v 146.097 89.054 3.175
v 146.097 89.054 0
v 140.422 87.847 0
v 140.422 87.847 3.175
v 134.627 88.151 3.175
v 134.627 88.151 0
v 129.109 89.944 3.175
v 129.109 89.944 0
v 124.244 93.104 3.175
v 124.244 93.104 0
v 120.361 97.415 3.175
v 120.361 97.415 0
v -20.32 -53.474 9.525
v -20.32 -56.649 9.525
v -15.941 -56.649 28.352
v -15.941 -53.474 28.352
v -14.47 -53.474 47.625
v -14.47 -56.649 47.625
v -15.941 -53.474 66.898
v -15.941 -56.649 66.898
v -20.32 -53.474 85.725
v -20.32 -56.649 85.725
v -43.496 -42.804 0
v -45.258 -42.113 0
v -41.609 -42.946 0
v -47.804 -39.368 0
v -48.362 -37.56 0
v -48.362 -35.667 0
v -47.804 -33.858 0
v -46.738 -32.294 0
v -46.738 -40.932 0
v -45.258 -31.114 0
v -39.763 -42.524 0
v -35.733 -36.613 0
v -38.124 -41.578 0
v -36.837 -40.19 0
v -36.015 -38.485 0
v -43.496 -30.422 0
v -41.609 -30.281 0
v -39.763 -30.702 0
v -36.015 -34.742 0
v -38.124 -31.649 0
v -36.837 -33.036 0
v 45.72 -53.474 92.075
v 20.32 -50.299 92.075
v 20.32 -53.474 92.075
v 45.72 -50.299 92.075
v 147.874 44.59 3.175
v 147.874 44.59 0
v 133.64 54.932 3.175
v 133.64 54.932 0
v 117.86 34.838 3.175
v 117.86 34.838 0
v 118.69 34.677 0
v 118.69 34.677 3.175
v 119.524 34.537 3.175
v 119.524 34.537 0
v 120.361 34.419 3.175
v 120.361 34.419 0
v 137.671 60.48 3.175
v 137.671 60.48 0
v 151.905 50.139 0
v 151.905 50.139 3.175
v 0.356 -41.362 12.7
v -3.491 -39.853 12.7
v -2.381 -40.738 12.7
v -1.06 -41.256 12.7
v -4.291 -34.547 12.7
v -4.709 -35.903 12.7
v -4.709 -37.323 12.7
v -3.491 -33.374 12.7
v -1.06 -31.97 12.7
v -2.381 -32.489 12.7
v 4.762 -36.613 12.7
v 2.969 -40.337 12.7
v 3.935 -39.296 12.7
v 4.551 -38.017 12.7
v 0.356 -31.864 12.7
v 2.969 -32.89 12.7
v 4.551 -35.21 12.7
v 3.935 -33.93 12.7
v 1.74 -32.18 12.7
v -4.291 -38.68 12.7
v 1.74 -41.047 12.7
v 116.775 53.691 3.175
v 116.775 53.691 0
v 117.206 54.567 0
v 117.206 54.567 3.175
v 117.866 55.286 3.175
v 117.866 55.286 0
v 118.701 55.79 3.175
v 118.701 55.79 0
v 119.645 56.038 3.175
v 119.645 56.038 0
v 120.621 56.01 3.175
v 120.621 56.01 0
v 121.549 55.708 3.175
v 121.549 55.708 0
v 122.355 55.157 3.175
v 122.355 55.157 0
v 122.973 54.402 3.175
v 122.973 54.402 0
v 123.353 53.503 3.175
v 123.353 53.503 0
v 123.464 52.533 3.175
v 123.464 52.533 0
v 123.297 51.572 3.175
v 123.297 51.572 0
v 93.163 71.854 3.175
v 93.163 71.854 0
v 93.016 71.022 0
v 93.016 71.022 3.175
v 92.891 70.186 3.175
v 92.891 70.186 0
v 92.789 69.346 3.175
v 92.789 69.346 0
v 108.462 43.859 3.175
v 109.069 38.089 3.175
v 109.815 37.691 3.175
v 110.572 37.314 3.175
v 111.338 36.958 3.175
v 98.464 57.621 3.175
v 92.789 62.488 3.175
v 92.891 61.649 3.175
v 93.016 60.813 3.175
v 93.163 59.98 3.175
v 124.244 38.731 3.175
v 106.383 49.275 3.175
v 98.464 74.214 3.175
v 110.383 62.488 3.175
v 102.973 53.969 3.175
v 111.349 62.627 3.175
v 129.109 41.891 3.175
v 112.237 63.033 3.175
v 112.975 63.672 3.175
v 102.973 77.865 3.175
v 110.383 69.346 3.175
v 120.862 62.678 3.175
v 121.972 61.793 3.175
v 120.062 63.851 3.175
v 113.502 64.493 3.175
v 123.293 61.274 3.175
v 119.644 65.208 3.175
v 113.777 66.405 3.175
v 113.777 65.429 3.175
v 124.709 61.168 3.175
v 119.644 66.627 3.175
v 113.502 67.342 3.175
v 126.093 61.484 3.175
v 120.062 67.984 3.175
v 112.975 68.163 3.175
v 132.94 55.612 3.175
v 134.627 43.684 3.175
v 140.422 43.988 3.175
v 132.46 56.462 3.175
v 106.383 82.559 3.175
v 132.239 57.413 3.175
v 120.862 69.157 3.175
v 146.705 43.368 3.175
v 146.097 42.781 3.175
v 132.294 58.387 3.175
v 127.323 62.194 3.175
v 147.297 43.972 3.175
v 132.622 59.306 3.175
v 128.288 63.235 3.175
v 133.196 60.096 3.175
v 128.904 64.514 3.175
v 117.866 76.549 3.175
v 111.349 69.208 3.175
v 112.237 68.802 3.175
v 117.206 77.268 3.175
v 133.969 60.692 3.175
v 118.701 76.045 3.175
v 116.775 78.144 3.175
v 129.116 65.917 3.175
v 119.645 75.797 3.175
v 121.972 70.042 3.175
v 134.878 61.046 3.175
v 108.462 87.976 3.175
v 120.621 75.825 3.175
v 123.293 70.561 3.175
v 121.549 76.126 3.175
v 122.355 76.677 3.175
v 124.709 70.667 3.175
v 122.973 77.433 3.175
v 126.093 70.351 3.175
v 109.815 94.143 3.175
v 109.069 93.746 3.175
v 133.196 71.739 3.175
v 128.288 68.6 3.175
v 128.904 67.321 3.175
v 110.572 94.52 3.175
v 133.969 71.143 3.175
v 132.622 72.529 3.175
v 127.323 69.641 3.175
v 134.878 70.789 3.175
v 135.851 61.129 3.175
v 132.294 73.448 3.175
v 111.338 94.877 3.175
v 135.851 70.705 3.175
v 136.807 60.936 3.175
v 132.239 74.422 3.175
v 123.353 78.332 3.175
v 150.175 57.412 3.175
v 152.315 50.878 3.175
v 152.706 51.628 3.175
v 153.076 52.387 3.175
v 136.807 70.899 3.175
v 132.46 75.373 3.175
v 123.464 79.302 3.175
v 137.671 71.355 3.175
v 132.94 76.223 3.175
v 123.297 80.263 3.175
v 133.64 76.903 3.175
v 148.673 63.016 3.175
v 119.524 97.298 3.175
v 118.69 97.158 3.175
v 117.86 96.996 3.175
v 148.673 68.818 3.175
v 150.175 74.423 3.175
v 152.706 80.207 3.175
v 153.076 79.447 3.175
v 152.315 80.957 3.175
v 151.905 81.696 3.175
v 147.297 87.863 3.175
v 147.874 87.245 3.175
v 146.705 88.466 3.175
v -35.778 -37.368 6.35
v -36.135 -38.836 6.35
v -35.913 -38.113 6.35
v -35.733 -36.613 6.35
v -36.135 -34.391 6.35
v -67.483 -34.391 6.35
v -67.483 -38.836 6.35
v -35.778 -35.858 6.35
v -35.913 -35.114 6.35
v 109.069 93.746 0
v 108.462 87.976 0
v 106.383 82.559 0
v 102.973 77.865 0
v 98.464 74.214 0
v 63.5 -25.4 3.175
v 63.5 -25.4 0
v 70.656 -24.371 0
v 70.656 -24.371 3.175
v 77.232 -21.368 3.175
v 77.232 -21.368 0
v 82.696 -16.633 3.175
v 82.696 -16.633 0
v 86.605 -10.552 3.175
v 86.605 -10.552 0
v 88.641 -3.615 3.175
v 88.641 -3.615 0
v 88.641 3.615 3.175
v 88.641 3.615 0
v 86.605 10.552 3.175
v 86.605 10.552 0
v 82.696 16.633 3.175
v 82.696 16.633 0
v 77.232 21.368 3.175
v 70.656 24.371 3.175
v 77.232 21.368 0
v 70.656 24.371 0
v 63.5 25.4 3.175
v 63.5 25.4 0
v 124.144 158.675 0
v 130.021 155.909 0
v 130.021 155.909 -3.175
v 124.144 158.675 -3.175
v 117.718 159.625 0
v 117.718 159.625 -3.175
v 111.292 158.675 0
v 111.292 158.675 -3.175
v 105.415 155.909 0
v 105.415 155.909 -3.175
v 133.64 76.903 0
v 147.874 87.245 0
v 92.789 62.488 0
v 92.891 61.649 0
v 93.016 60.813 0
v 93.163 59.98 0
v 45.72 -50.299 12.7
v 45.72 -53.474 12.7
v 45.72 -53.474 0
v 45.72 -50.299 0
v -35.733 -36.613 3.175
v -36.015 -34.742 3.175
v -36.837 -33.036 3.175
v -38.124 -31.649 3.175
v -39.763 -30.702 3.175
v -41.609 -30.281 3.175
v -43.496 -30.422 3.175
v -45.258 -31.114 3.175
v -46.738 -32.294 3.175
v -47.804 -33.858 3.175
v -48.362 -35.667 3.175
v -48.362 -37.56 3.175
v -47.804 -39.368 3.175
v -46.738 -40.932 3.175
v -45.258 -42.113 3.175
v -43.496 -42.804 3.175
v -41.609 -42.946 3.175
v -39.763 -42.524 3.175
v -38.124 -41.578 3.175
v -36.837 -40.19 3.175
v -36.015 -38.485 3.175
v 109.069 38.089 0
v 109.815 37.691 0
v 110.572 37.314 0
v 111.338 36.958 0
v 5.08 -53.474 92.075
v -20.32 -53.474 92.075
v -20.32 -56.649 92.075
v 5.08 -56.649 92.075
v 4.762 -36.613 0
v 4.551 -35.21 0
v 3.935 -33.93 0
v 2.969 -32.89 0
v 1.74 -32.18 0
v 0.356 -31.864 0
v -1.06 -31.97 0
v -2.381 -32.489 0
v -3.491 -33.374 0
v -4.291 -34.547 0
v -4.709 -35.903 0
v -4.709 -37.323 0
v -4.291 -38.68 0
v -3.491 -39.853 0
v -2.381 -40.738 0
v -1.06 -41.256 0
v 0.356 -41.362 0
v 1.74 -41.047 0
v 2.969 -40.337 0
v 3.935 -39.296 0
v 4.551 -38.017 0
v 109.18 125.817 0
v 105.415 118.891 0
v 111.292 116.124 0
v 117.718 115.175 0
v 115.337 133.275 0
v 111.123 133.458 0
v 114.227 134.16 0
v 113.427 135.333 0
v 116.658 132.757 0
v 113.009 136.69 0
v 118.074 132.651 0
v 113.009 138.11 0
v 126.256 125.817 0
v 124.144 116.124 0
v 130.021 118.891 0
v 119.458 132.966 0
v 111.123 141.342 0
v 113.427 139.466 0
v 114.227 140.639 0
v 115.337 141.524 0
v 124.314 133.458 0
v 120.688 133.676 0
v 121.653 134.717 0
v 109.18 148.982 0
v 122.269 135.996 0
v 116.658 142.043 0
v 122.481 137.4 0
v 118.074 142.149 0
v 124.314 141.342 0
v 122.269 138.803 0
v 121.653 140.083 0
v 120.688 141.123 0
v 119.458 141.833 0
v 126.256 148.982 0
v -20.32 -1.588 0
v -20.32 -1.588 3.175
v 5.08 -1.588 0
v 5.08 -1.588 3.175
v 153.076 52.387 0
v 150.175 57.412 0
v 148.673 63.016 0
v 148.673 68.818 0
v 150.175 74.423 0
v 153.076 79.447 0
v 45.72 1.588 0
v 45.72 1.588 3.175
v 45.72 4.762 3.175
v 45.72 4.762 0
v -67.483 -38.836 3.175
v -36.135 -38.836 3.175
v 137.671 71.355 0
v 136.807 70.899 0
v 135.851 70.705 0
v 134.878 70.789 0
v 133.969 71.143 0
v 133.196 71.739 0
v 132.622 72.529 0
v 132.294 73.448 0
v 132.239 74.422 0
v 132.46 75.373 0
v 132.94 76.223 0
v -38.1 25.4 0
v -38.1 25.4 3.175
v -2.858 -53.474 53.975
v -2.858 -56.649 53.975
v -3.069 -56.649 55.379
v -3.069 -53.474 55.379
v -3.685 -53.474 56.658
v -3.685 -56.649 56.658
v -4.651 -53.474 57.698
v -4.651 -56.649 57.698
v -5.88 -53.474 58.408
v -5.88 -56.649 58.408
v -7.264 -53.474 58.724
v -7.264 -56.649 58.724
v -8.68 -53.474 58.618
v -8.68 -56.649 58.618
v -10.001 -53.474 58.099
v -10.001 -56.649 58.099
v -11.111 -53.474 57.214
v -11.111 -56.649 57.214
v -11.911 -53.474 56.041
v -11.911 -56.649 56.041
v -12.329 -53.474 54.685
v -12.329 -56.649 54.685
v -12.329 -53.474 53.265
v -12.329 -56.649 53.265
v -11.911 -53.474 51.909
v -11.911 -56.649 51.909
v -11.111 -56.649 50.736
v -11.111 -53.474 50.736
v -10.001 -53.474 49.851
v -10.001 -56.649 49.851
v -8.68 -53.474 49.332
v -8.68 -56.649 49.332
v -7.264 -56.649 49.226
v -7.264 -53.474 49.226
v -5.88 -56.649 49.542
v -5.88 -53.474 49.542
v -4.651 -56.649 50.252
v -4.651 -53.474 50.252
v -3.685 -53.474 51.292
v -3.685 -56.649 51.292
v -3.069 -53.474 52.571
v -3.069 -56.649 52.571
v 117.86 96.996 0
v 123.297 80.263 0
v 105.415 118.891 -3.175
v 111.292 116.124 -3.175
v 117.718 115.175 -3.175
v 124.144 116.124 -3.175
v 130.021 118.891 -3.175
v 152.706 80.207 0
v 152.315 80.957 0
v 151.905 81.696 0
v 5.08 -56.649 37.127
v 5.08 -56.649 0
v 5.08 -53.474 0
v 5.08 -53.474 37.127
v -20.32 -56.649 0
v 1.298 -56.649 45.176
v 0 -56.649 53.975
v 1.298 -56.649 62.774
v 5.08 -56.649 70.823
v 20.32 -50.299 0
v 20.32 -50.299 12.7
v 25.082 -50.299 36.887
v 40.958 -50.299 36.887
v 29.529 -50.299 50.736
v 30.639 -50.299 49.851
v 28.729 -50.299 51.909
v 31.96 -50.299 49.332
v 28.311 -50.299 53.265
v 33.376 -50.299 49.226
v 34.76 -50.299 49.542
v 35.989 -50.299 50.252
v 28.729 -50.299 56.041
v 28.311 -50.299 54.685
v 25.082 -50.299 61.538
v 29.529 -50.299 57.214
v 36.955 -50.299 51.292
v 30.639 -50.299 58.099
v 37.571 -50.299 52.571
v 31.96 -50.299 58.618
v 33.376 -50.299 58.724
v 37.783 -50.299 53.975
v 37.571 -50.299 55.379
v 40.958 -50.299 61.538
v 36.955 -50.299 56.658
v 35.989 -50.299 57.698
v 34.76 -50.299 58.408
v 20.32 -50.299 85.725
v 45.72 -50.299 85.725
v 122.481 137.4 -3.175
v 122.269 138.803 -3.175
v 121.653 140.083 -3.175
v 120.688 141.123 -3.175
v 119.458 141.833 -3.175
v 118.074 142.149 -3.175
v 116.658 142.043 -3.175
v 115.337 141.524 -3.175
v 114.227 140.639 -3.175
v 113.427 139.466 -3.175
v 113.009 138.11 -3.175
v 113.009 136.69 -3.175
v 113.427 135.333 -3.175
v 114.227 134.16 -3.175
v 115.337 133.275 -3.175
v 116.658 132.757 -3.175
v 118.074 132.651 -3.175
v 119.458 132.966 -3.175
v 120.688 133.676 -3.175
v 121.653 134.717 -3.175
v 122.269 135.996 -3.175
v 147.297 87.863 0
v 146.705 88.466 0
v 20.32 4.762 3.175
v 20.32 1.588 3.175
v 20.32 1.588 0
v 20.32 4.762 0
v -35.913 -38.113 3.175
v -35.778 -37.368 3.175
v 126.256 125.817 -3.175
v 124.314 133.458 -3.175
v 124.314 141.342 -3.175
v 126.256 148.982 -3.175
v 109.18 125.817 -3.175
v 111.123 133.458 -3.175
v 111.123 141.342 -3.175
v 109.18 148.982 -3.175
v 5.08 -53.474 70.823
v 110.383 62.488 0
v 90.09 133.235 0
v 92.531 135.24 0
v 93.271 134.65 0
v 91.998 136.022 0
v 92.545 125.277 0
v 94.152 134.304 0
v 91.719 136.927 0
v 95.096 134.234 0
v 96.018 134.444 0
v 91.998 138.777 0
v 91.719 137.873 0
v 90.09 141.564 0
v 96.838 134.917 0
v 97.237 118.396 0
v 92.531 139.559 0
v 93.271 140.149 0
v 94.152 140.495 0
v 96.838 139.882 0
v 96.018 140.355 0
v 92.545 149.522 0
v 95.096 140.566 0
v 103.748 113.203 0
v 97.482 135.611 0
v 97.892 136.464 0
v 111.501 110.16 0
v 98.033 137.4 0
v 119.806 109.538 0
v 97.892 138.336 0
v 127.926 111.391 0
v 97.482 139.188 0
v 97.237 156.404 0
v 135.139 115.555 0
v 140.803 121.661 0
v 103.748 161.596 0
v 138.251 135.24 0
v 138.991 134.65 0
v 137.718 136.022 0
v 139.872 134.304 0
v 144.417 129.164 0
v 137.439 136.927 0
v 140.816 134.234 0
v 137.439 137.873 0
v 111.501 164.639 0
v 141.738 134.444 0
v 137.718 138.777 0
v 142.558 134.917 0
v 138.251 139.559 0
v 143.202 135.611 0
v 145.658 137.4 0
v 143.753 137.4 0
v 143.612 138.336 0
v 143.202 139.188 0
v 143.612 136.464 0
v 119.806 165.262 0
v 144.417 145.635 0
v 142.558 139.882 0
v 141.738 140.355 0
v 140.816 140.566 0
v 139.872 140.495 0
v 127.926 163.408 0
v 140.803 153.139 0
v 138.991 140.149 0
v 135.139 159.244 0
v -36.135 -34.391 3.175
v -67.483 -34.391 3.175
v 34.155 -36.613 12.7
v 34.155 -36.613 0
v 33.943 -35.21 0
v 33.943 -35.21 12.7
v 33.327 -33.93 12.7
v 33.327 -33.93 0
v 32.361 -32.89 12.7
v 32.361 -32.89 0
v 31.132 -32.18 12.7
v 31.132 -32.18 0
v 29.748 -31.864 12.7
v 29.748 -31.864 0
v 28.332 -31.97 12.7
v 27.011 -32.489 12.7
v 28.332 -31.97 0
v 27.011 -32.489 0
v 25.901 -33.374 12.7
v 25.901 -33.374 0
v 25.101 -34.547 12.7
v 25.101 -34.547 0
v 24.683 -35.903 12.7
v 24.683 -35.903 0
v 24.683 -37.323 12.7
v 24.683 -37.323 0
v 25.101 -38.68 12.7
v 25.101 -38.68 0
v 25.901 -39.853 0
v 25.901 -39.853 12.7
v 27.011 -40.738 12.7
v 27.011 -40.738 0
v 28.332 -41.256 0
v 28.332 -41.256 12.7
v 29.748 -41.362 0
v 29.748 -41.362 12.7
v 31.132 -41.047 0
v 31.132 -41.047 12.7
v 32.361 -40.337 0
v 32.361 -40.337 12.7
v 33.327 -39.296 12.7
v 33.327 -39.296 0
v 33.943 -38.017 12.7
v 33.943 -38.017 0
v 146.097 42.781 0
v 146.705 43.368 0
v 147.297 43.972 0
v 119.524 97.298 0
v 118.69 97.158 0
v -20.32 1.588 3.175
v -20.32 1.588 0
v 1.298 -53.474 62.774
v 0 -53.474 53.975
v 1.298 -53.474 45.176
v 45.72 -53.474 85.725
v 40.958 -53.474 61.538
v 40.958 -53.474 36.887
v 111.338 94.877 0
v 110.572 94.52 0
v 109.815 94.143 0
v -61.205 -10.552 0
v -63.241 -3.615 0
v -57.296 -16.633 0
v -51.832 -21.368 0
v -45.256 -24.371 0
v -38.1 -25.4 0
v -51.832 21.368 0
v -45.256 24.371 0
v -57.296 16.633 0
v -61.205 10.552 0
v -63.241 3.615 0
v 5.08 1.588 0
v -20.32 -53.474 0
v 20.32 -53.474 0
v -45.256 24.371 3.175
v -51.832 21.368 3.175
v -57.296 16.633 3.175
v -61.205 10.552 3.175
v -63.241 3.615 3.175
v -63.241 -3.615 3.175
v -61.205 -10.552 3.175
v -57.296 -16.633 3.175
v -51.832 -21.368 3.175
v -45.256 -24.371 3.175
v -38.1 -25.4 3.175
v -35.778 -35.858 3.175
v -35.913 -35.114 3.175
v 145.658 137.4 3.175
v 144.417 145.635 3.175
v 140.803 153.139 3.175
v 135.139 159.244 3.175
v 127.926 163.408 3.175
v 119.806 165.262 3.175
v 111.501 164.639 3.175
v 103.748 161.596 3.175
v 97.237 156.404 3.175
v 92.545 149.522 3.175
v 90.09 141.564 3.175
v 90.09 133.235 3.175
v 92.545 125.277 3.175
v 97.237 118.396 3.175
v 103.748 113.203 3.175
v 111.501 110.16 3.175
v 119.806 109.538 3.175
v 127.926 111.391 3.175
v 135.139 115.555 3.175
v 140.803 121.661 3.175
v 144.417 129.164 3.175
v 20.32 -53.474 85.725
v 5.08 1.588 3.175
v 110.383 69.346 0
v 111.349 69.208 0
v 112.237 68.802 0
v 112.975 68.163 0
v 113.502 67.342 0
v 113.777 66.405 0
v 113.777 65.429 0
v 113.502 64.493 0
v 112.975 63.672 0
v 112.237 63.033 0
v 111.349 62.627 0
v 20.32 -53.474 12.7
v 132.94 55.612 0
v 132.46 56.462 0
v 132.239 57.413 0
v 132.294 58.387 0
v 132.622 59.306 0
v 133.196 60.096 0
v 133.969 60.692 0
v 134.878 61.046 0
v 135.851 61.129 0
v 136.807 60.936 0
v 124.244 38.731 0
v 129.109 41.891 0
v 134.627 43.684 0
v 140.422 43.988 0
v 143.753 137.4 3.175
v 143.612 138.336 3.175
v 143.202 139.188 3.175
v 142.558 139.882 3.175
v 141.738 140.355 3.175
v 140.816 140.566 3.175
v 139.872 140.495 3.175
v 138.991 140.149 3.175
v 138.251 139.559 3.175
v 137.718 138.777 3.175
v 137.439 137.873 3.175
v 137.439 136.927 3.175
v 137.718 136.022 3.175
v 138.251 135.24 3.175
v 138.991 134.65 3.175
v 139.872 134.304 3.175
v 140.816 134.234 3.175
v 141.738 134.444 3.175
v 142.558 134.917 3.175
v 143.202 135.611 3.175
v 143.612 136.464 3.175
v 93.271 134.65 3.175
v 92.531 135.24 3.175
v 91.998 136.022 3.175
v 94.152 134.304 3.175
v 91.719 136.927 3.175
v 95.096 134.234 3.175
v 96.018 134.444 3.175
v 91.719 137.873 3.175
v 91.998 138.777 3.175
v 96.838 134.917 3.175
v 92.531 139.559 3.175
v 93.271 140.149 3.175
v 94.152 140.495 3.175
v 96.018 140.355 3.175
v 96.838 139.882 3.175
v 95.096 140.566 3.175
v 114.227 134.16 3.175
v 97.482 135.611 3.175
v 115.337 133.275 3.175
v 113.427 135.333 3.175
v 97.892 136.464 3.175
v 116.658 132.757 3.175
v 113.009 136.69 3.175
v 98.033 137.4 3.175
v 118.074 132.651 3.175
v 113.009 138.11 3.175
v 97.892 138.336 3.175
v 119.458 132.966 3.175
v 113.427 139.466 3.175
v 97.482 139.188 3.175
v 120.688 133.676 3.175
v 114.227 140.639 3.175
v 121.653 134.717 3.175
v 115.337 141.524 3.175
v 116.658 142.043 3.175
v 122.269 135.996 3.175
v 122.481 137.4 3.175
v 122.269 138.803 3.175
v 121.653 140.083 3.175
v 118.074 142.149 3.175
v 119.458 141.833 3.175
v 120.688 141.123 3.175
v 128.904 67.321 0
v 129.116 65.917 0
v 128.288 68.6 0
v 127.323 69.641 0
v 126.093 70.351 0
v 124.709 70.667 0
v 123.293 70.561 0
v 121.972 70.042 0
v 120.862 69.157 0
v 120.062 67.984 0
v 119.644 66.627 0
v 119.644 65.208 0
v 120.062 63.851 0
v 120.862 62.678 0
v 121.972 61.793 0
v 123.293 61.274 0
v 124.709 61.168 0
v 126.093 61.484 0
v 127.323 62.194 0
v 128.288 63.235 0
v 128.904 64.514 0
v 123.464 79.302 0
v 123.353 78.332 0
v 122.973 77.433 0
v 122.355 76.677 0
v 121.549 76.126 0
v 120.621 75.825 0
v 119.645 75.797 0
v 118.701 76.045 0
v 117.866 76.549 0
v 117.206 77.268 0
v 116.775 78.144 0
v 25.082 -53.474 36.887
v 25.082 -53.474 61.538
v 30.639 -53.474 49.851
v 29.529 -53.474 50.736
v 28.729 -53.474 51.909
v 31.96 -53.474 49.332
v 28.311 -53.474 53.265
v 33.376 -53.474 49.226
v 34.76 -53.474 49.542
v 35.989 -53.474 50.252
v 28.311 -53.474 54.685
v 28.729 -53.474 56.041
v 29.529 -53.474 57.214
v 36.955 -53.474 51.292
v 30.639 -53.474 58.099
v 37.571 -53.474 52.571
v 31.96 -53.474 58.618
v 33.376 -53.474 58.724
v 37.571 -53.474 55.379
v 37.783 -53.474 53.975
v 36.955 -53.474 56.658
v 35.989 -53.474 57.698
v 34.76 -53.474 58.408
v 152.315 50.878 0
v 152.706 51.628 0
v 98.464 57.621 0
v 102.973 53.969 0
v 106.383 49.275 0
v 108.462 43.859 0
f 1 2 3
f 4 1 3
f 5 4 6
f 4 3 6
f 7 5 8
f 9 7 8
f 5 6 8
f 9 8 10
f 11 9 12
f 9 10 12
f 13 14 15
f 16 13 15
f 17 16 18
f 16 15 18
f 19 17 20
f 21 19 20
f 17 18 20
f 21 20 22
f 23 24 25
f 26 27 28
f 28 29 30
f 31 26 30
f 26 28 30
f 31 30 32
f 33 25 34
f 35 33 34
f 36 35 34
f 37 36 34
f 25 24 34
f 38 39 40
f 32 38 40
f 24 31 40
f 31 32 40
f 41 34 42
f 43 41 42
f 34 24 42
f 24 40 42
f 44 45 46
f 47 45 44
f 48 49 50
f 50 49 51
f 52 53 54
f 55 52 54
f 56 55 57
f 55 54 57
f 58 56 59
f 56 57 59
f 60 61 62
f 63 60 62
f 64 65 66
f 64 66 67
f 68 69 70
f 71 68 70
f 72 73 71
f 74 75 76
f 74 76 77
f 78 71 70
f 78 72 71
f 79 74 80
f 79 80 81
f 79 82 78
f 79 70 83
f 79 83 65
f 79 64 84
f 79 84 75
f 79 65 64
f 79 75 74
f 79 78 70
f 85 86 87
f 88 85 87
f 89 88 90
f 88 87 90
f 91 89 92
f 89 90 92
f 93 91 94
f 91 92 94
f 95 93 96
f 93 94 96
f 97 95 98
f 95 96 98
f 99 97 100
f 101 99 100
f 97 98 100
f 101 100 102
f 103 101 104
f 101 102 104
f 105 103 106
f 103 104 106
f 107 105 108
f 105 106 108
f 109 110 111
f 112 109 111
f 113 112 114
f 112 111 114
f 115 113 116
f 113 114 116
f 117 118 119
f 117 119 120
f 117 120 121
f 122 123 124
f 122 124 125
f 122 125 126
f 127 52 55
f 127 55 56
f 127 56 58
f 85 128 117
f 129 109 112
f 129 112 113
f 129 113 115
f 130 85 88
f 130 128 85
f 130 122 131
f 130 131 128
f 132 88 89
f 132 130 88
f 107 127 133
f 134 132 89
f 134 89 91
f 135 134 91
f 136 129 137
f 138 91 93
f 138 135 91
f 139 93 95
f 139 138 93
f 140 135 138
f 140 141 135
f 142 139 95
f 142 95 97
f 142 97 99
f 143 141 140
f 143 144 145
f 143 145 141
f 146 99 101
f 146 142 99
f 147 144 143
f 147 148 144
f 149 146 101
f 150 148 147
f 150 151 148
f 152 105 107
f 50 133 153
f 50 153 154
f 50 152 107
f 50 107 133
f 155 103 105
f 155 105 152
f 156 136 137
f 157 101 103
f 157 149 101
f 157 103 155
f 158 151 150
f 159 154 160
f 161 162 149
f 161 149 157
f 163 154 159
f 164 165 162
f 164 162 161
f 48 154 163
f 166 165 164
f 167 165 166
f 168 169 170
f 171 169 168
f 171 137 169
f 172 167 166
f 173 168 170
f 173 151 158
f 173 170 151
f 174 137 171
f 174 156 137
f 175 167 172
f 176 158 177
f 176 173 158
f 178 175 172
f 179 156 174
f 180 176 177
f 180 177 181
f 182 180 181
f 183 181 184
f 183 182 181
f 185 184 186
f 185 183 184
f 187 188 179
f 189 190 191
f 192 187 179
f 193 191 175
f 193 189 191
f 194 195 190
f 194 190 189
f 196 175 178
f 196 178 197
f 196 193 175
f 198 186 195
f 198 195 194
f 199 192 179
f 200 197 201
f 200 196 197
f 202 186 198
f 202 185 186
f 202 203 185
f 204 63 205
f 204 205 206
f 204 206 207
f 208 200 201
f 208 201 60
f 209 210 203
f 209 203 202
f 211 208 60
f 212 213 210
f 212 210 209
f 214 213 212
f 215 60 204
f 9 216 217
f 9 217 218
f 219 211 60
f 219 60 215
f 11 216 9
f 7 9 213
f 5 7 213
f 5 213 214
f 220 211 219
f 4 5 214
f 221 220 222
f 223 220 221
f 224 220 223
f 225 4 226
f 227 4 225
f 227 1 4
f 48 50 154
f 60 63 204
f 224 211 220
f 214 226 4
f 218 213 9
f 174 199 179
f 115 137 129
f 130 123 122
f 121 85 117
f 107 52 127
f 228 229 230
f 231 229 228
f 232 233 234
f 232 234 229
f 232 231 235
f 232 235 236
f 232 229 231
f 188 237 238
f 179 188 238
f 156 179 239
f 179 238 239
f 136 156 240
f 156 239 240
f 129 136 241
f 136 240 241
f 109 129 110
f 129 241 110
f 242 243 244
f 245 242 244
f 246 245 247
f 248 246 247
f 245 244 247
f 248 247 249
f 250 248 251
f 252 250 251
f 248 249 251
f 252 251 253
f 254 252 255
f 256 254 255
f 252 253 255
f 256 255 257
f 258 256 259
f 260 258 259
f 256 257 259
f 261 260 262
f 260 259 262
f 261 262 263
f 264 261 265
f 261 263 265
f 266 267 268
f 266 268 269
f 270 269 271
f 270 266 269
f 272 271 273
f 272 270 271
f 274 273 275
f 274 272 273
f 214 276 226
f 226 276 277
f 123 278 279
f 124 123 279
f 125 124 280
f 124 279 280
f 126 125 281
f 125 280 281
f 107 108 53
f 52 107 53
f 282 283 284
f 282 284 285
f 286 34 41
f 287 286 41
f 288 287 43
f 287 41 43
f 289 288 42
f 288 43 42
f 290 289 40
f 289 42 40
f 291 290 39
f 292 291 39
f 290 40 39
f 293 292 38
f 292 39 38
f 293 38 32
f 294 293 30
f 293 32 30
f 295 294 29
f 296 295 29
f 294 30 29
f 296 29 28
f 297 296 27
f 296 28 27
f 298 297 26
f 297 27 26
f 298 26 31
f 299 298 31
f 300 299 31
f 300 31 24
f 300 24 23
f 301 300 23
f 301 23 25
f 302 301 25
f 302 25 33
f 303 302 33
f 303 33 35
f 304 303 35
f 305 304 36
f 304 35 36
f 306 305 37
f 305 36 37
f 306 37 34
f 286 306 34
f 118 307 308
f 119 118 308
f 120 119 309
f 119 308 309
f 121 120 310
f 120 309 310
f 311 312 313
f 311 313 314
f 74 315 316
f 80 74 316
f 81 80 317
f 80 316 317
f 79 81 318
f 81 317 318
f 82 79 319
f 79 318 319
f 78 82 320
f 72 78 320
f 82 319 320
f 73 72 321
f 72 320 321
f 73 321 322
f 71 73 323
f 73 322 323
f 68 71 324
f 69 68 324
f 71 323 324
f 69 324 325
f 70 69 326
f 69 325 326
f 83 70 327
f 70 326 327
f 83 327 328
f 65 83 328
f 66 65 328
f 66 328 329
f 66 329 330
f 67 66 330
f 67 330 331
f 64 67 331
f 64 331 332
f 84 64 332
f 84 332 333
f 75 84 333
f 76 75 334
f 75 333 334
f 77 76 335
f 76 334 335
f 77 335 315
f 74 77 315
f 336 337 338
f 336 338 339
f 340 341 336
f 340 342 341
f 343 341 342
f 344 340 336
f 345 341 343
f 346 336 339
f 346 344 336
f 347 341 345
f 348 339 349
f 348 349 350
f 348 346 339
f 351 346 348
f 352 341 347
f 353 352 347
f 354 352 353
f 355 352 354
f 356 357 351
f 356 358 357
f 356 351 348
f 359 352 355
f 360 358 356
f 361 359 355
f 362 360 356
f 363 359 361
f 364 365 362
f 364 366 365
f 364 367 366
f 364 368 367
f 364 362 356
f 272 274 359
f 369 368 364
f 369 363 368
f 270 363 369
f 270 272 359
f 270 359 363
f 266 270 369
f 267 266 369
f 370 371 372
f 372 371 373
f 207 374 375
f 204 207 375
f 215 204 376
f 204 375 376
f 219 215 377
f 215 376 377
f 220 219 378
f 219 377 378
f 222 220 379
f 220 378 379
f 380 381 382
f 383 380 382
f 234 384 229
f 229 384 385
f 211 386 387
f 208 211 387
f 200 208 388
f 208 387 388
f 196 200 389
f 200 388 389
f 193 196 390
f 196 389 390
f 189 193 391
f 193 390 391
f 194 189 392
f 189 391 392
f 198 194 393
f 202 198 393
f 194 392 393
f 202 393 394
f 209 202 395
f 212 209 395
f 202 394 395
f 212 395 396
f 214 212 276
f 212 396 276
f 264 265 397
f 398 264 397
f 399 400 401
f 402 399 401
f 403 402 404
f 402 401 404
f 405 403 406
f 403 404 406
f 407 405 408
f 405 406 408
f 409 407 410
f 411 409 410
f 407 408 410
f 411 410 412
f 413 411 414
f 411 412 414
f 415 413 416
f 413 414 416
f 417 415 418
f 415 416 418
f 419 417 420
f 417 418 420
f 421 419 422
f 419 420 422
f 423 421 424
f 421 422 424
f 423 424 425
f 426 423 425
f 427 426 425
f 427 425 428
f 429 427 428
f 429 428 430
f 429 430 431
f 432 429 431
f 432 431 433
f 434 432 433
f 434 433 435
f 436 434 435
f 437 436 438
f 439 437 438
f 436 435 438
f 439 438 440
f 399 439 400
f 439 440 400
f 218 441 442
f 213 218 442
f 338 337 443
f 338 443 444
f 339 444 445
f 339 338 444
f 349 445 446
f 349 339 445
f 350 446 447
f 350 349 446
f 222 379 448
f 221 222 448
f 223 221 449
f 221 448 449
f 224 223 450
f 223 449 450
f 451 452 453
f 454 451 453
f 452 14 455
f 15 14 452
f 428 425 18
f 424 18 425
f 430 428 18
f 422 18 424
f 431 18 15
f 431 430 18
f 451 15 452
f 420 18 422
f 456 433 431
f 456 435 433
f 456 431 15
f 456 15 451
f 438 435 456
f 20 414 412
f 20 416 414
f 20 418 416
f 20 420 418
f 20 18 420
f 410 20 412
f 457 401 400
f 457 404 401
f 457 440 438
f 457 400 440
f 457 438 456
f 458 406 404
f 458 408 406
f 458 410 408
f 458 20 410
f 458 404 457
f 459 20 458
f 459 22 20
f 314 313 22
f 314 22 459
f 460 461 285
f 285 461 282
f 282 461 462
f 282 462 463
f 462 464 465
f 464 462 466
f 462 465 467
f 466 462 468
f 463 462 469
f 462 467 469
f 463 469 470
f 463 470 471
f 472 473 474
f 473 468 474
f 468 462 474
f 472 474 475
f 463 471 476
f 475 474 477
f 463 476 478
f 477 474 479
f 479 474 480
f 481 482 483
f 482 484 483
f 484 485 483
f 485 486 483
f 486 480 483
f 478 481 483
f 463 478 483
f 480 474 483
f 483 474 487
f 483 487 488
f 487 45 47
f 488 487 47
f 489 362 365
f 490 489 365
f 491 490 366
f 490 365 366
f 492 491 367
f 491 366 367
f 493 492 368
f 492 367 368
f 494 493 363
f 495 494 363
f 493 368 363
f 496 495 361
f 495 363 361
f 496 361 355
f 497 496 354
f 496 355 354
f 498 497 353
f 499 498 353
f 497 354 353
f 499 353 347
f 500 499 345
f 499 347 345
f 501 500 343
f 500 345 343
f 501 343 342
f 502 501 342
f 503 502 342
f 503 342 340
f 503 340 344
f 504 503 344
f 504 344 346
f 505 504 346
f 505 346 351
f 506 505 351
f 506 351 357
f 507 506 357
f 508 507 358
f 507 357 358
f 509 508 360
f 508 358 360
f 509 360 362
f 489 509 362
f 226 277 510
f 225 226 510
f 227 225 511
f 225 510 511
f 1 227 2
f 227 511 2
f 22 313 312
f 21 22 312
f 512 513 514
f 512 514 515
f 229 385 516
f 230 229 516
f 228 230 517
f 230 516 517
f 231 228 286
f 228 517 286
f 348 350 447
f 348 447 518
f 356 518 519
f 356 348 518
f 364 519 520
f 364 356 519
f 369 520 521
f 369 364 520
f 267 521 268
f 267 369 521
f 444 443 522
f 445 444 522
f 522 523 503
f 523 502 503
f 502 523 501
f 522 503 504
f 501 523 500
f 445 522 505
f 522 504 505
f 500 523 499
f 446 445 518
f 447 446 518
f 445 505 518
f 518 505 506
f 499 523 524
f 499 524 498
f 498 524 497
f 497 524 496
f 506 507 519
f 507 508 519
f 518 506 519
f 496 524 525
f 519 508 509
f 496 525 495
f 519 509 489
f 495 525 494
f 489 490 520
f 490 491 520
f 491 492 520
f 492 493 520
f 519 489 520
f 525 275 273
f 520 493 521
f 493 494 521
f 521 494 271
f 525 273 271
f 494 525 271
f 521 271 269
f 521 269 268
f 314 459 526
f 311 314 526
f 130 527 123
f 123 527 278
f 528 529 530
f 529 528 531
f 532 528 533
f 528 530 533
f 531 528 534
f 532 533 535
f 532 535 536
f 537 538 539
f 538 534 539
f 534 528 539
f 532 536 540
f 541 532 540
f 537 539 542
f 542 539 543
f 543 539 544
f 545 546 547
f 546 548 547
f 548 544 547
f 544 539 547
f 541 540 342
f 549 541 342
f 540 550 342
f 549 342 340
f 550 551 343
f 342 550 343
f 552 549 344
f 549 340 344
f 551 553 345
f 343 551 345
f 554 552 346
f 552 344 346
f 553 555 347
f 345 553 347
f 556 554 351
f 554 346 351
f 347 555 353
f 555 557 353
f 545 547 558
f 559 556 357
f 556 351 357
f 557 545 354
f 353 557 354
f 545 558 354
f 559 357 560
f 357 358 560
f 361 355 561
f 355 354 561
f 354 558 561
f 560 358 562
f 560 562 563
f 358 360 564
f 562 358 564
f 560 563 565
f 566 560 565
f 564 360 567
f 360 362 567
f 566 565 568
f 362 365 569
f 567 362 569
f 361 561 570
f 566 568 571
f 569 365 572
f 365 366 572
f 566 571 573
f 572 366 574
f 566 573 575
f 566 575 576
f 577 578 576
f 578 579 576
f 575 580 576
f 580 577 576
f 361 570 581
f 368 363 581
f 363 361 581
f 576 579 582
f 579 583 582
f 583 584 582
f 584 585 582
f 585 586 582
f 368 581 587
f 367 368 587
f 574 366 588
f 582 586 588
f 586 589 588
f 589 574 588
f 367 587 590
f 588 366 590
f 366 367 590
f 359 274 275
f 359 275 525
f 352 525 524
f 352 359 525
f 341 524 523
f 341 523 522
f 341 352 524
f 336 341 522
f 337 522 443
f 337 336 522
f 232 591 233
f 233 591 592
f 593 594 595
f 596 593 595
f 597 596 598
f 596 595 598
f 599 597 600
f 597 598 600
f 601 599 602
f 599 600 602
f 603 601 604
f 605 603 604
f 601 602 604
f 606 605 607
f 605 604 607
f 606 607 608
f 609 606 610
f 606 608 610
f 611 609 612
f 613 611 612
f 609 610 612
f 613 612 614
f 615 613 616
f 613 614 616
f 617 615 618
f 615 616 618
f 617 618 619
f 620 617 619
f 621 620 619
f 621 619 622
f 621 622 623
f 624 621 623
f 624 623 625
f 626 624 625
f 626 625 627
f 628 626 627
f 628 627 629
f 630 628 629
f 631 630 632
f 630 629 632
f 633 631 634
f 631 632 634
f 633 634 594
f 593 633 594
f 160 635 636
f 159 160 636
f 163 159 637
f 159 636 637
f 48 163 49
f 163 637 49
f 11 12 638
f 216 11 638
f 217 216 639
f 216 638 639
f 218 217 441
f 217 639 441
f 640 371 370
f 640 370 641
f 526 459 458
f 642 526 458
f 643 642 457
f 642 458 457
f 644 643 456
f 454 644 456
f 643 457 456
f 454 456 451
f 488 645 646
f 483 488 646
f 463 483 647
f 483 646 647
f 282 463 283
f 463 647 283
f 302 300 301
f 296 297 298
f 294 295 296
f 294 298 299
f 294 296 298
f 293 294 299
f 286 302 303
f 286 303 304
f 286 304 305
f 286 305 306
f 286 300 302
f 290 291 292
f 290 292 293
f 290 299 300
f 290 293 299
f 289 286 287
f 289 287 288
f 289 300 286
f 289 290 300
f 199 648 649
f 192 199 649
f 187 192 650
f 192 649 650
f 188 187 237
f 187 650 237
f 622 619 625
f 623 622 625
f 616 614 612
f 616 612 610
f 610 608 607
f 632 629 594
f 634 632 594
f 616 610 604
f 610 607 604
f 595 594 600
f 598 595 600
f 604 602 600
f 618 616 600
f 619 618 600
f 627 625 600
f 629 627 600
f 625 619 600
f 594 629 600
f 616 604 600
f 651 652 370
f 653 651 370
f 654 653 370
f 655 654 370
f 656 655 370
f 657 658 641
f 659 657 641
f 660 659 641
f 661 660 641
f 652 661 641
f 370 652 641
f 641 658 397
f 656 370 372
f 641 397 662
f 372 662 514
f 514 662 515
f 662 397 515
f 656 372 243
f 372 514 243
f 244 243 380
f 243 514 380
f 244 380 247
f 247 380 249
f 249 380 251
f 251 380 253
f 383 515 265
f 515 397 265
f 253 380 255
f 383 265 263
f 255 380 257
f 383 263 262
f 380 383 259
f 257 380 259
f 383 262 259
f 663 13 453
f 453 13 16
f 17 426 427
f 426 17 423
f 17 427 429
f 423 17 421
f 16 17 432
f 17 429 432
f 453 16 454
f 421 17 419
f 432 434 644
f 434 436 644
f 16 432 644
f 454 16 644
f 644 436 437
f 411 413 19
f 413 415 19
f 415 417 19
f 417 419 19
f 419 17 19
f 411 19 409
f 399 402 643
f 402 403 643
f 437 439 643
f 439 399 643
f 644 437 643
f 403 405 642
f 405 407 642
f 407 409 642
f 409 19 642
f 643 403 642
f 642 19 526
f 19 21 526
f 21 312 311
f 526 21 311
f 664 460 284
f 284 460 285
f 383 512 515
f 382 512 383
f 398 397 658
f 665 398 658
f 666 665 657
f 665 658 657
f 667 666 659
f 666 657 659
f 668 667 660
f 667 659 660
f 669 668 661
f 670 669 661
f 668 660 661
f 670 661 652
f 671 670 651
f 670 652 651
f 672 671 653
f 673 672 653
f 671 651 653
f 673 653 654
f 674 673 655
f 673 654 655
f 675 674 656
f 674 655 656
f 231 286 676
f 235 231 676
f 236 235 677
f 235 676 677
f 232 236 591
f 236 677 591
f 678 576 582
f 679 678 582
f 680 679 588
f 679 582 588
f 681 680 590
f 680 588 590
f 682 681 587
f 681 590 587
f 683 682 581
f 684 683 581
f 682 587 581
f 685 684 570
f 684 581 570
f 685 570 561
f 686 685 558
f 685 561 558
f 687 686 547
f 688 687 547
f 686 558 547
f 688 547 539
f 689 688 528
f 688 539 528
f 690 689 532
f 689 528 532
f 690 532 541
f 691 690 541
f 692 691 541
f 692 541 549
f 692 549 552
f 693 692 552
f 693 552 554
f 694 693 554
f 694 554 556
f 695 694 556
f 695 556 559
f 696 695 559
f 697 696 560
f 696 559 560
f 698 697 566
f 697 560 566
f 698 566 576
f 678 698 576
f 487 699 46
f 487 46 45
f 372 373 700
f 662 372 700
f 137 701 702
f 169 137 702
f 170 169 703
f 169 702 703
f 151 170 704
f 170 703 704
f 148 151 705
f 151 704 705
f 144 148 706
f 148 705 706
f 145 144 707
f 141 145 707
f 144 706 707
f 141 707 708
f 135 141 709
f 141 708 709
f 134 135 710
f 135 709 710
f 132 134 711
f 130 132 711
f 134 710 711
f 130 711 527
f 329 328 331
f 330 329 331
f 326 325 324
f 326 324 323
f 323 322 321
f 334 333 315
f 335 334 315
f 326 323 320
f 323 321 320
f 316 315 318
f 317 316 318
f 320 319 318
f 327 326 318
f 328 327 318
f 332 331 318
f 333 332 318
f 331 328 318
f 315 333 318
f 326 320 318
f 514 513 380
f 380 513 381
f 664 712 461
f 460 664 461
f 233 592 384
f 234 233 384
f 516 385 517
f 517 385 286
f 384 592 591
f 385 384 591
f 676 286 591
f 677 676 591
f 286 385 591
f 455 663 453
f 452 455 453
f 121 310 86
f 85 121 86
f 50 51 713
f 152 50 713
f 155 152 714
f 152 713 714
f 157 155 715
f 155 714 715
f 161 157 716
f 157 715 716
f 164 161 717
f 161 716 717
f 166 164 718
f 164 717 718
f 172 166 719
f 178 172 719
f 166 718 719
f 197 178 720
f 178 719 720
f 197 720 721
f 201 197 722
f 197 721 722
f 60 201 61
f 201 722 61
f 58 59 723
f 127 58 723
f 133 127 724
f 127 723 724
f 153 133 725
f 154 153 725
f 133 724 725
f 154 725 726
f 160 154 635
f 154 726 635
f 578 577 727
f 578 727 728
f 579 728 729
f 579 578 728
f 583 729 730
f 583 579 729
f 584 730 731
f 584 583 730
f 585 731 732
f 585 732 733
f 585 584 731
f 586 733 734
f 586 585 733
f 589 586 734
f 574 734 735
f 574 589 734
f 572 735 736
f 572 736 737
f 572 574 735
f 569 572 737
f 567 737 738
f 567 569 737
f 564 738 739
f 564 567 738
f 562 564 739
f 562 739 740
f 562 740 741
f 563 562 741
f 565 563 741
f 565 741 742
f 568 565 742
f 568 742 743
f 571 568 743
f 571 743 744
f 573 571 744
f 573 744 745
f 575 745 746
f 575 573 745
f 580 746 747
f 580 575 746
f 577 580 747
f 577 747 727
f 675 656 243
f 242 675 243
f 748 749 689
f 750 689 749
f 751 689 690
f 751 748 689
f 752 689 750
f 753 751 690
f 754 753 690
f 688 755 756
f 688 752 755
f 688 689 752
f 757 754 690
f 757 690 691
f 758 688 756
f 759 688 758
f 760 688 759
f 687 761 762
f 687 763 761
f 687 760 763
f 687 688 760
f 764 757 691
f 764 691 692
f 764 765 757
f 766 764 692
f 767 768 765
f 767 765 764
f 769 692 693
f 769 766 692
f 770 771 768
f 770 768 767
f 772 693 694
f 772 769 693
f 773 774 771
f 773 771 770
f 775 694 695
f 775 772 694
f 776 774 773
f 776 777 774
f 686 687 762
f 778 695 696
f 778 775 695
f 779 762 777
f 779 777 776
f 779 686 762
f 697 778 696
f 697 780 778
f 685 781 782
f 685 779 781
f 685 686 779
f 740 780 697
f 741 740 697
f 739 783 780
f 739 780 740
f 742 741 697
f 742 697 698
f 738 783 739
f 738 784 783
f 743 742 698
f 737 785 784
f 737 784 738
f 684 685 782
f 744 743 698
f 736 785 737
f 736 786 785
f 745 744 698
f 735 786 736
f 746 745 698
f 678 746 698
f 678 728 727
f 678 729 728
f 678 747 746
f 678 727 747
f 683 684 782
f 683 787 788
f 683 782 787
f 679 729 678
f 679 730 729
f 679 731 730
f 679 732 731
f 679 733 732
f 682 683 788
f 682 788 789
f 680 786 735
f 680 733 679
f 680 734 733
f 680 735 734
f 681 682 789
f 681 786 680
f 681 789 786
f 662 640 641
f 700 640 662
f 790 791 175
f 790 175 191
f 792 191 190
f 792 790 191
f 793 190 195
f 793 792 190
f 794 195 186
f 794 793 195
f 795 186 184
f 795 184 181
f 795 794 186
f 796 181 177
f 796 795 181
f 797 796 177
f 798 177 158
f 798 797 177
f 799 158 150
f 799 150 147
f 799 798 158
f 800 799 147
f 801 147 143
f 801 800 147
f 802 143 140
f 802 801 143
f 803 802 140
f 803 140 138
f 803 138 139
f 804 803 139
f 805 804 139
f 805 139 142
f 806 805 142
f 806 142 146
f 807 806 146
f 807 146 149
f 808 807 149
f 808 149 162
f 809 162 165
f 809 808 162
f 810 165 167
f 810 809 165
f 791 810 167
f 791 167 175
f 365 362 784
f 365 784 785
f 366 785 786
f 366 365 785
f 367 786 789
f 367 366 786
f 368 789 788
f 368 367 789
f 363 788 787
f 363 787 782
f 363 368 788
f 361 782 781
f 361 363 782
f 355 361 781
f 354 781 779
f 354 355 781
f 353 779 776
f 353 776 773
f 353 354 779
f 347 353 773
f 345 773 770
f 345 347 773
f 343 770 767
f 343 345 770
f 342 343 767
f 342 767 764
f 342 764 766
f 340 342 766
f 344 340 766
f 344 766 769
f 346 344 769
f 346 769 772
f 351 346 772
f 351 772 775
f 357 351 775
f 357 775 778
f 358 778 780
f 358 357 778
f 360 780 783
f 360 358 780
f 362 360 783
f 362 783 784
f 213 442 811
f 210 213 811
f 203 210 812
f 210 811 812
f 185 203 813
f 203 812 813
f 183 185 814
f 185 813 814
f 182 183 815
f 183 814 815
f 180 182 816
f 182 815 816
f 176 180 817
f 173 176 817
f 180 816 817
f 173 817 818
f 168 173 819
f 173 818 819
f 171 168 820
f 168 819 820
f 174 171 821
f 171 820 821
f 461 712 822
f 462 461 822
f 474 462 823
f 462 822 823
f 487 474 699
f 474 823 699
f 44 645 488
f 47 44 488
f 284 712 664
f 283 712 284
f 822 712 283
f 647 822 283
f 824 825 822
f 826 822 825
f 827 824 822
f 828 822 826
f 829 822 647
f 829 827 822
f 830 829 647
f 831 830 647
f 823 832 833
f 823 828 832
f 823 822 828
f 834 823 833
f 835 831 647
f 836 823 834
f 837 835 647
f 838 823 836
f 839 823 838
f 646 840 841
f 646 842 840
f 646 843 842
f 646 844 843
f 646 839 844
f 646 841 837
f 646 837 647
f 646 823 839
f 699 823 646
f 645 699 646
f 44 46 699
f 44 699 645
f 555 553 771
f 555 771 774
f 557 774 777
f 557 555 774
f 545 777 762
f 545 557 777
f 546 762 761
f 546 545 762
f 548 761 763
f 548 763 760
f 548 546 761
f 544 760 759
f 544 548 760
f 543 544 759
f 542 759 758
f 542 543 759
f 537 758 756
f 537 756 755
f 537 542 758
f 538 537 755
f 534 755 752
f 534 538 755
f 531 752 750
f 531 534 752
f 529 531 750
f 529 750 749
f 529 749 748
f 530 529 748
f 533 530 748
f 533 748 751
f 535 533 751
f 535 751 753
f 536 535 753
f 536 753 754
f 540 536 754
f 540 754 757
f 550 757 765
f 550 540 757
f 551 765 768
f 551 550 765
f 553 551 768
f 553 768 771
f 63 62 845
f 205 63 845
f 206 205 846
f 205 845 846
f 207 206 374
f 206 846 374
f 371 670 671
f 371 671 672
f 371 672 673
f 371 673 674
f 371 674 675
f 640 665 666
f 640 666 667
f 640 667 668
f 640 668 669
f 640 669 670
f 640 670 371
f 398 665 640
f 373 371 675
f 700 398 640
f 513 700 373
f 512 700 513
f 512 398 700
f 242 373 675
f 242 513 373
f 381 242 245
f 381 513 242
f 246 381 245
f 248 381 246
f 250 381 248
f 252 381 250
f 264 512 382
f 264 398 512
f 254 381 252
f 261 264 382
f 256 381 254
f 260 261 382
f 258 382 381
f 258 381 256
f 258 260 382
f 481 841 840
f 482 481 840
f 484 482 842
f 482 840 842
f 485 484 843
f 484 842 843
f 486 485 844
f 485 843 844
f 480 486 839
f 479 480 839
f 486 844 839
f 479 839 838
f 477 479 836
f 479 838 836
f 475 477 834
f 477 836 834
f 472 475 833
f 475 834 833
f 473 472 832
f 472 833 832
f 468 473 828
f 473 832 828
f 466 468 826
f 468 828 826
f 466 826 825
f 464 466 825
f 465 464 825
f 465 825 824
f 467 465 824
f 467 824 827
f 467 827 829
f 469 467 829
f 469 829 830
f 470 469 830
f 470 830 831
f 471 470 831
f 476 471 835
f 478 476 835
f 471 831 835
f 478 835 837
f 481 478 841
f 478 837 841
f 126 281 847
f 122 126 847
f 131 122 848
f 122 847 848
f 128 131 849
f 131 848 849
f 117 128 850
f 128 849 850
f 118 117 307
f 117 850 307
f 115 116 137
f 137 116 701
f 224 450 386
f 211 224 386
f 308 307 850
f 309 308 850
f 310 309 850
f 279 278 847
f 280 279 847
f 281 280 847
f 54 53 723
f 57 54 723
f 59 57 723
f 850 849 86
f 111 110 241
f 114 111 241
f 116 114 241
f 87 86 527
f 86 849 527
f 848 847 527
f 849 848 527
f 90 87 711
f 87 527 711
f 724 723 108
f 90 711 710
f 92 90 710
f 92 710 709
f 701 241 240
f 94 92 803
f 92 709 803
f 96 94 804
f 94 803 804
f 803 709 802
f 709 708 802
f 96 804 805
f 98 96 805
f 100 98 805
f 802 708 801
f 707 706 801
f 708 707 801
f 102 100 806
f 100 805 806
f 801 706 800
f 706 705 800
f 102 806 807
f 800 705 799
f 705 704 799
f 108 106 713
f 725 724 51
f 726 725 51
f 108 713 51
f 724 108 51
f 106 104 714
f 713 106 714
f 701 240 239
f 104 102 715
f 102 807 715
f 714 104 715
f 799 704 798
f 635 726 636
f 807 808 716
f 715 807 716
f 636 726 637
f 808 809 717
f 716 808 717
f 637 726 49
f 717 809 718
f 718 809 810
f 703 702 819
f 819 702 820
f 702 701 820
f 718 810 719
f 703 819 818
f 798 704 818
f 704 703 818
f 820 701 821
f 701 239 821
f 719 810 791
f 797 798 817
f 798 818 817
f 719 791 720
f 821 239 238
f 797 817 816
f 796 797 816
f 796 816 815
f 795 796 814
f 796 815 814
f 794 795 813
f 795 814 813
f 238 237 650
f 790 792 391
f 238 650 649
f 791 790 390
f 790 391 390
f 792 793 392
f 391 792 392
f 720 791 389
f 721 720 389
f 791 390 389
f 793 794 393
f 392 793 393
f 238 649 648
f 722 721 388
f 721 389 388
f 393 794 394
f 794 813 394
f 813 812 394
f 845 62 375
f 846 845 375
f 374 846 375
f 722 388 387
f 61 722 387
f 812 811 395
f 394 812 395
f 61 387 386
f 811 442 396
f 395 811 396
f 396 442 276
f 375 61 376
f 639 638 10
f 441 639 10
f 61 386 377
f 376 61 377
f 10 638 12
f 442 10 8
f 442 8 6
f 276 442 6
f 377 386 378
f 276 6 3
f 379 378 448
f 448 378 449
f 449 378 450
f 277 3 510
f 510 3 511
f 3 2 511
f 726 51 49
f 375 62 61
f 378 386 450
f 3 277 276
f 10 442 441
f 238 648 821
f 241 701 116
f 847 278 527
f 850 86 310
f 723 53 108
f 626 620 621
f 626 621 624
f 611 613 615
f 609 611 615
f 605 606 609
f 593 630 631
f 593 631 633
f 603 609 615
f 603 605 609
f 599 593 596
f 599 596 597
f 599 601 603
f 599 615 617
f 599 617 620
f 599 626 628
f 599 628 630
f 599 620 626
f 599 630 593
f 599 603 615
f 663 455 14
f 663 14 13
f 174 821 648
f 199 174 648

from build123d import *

# Parameters (mm, degrees)
F1_DEPTH  = 3.175
F2_R      = 4.7625
F4_DEPTH  = 3.175
F5_DEPTH  = 3.175
F2_R_2    = 27.94
F2_R_3    = 3.175
F6_DEPTH  = 3.175
F8_DEPTH  = 3.175
F7_W      = 25.4
F7_H      = 3.175
F9_DEPTH  = 3.175
F10_DEPTH = 3.175
F11_DEPTH = 88.9
F13_DEPTH = 3.175
F14_DEPTH = 3.175
F16_DEPTH = 3.175
F17_DEPTH = 3.175
F12_R     = 4.7625
F18_DEPTH = 3.175
F15_R     = 4.7625
F19_DEPTH = 3.175
F20_DEPTH = 3.175
F21_R     = 4.7625
F22_DEPTH = 12.7
F21_R_2   = 6.35
F23_DEPTH = 3.175
F25_DEPTH = 3.175
F26_DEPTH = 12.7


with BuildPart() as f1:
    # F0 (on Top) → F1 (new body)
    with BuildSketch(Plane.XY):
        with BuildLine():
            Line((63.5, 25.4), (-38.1, 25.4))
            ThreePointArc((-38.1, 25.4), (-63.5, 0), (-38.1, -25.4))
            Line((-38.1, -25.4), (63.5, -25.4))
            ThreePointArc((63.5, -25.4), (88.9, 0), (63.5, 25.4))
        make_face()
    extrude(amount=F1_DEPTH)

    # F7 (on face) → F9 (cut)
    with BuildSketch(Plane.XY.offset(3.175)):
        with Locations((-7.62, 0)):
            Rectangle(F7_W, F7_H)
    extrude(amount=-F9_DEPTH, mode=Mode.SUBTRACT)

    # F7 (on face) → F10 (cut)
    with BuildSketch(Plane.XY.offset(3.175)):
        with Locations((33.02, 3.175)):
            Rectangle(F7_W, F7_H)
    extrude(amount=-F10_DEPTH, mode=Mode.SUBTRACT)


with BuildPart() as f4:
    # F2 (on Top) → F4 (new body)
    with BuildSketch(Plane.XY):
        with BuildLine():
            ThreePointArc((120.3612832322, 34.4193587213), (131.809729009, 42.968420609), (146.0967287001, 42.7813118451))
            ThreePointArc((146.0967287001, 42.7813118451), (147.0032712022, 43.6680444399), (147.873681045, 44.5902703929))
            Line((147.873681045, 44.5902703929), (133.639600716, 54.9319350989))
            ThreePointArc((133.639600716, 54.9319350989), (132.8809970724, 59.7215700028), (137.6706319762, 60.4801736464))
            Line((137.6706319762, 60.4801736464), (151.9047123053, 50.1385089403))
            ThreePointArc((151.9047123053, 50.1385089403), (152.5128298738, 51.2513013853), (153.076025647, 52.3874899805))
            ThreePointArc((153.076025647, 52.3874899805), (148.4831489347, 65.9174143472), (153.076025647, 79.4473387139))
            ThreePointArc((153.076025647, 79.4473387139), (152.5128298738, 80.583527309), (151.9047123053, 81.6963197541))
            Line((151.9047123053, 81.6963197541), (137.6706319762, 71.354655048))
            ThreePointArc((137.6706319762, 71.354655048), (132.8809970724, 72.1132586916), (133.639600716, 76.9028935954))
            Line((133.639600716, 76.9028935954), (147.873681045, 87.2445583015))
            ThreePointArc((147.873681045, 87.2445583015), (147.0032712022, 88.1667842544), (146.0967287001, 89.0535168493))
            ThreePointArc((146.0967287001, 89.0535168493), (131.809729009, 88.8664080854), (120.3612832322, 97.4154699731))
            ThreePointArc((120.3612832322, 97.4154699731), (119.1066666, 97.2309405477), (117.8604194306, 96.9964581482))
            Line((117.8604194306, 96.9964581482), (123.2973543177, 80.2632931535))
            ThreePointArc((123.2973543177, 80.2632931535), (121.095800797, 75.9425010854), (116.7750087289, 78.1440546061))
            Line((116.7750087289, 78.1440546061), (111.3380738418, 94.8772196008))
            ThreePointArc((111.3380738418, 94.8772196008), (110.1920134063, 94.33439414), (109.0685435545, 93.7462364274))
            ThreePointArc((109.0685435545, 93.7462364274), (104.8315688605, 80.100672485), (93.1631635397, 71.8543589368))
            ThreePointArc((93.1631635397, 71.8543589368), (92.9509635914, 70.6041248848), (92.7888580509, 69.3464143472))
            Line((92.7888580509, 69.3464143472), (110.3831489347, 69.3464143472))
            ThreePointArc((110.3831489347, 69.3464143472), (113.8121489347, 65.9174143472), (110.3831489347, 62.4884143472))
            Line((110.3831489347, 62.4884143472), (92.7888580509, 62.4884143472))
            ThreePointArc((92.7888580509, 62.4884143472), (92.9509635914, 61.2307038095), (93.1631635397, 59.9804697575))
            ThreePointArc((93.1631635397, 59.9804697575), (104.8315688605, 51.7341562094), (109.0685435545, 38.088592267))
            ThreePointArc((109.0685435545, 38.088592267), (110.1920134063, 37.5004345544), (111.3380738418, 36.9576090936))
            Line((111.3380738418, 36.9576090936), (116.7750087289, 53.6907740882))
            ThreePointArc((116.7750087289, 53.6907740882), (121.095800797, 55.8923276089), (123.2973543177, 51.5715355408))
            Line((123.2973543177, 51.5715355408), (117.8604194306, 34.8383705461))
            ThreePointArc((117.8604194306, 34.8383705461), (119.1066666, 34.6038881466), (120.3612832322, 34.4193587213))
        make_face()
        with Locations((124.3531489347, 65.9174143472)):
            Circle(F2_R, mode=Mode.SUBTRACT)
    extrude(amount=F4_DEPTH)

    # F2 (on Top) → F8 (join)
    with BuildSketch(Plane.XY):
        with BuildLine():
            ThreePointArc((120.3612832322, 34.4193587213), (131.809729009, 42.968420609), (146.0967287001, 42.7813118451))
            ThreePointArc((146.0967287001, 42.7813118451), (147.0032712022, 43.6680444399), (147.873681045, 44.5902703929))
            Line((147.873681045, 44.5902703929), (133.639600716, 54.9319350989))
            ThreePointArc((133.639600716, 54.9319350989), (132.8809970724, 59.7215700028), (137.6706319762, 60.4801736464))
            Line((137.6706319762, 60.4801736464), (151.9047123053, 50.1385089403))
            ThreePointArc((151.9047123053, 50.1385089403), (152.5128298738, 51.2513013853), (153.076025647, 52.3874899805))
            ThreePointArc((153.076025647, 52.3874899805), (148.4831489347, 65.9174143472), (153.076025647, 79.4473387139))
            ThreePointArc((153.076025647, 79.4473387139), (152.5128298738, 80.583527309), (151.9047123053, 81.6963197541))
            Line((151.9047123053, 81.6963197541), (137.6706319762, 71.354655048))
            ThreePointArc((137.6706319762, 71.354655048), (132.8809970724, 72.1132586916), (133.639600716, 76.9028935954))
            Line((133.639600716, 76.9028935954), (147.873681045, 87.2445583015))
            ThreePointArc((147.873681045, 87.2445583015), (147.0032712022, 88.1667842544), (146.0967287001, 89.0535168493))
            ThreePointArc((146.0967287001, 89.0535168493), (131.809729009, 88.8664080854), (120.3612832322, 97.4154699731))
            ThreePointArc((120.3612832322, 97.4154699731), (119.1066666, 97.2309405477), (117.8604194306, 96.9964581482))
            Line((117.8604194306, 96.9964581482), (123.2973543177, 80.2632931535))
            ThreePointArc((123.2973543177, 80.2632931535), (121.095800797, 75.9425010854), (116.7750087289, 78.1440546061))
            Line((116.7750087289, 78.1440546061), (111.3380738418, 94.8772196008))
            ThreePointArc((111.3380738418, 94.8772196008), (110.1920134063, 94.33439414), (109.0685435545, 93.7462364274))
            ThreePointArc((109.0685435545, 93.7462364274), (104.8315688605, 80.100672485), (93.1631635397, 71.8543589368))
            ThreePointArc((93.1631635397, 71.8543589368), (92.9509635914, 70.6041248848), (92.7888580509, 69.3464143472))
            Line((92.7888580509, 69.3464143472), (110.3831489347, 69.3464143472))
            ThreePointArc((110.3831489347, 69.3464143472), (113.8121489347, 65.9174143472), (110.3831489347, 62.4884143472))
            Line((110.3831489347, 62.4884143472), (92.7888580509, 62.4884143472))
            ThreePointArc((92.7888580509, 62.4884143472), (92.9509635914, 61.2307038095), (93.1631635397, 59.9804697575))
            ThreePointArc((93.1631635397, 59.9804697575), (104.8315688605, 51.7341562094), (109.0685435545, 38.088592267))
            ThreePointArc((109.0685435545, 38.088592267), (110.1920134063, 37.5004345544), (111.3380738418, 36.9576090936))
            Line((111.3380738418, 36.9576090936), (116.7750087289, 53.6907740882))
            ThreePointArc((116.7750087289, 53.6907740882), (121.095800797, 55.8923276089), (123.2973543177, 51.5715355408))
            Line((123.2973543177, 51.5715355408), (117.8604194306, 34.8383705461))
            ThreePointArc((117.8604194306, 34.8383705461), (119.1066666, 34.6038881466), (120.3612832322, 34.4193587213))
        make_face()
        with Locations((124.3531489347, 65.9174143472)):
            Circle(F2_R, mode=Mode.SUBTRACT)
    extrude(amount=F8_DEPTH)


with BuildPart() as f5:
    # F2 (on Top) → F5 (new body)
    with BuildSketch(Plane.XY):
        with BuildLine():
            ThreePointArc((130.021378454, 118.8906994246), (124.068253454, 137.399717233), (130.021378454, 155.9087350415))
            ThreePointArc((130.021378454, 155.9087350415), (117.718253454, 159.624717233), (105.415128454, 155.9087350415))
            ThreePointArc((105.415128454, 155.9087350415), (111.368253454, 137.399717233), (105.415128454, 118.8906994246))
            ThreePointArc((105.415128454, 118.8906994246), (117.718253454, 115.174717233), (130.021378454, 118.8906994246))
        make_face()
        with Locations((117.718253454, 137.399717233)):
            Circle(F2_R, mode=Mode.SUBTRACT)
    extrude(amount=F5_DEPTH)

    # F2 (on Top) → F6 (join)
    with BuildSketch(Plane.XY):
        with Locations((117.718253454, 137.399717233)):
            Circle(F2_R_2)
        with Locations((94.858253454, 137.399717233)):
            Circle(F2_R_3, mode=Mode.SUBTRACT)
        with BuildLine():
            ThreePointArc((105.415128454, 155.9087350415), (117.718253454, 159.624717233), (130.021378454, 155.9087350415))
            ThreePointArc((130.021378454, 155.9087350415), (124.068253454, 137.399717233), (130.021378454, 118.8906994246))
            ThreePointArc((130.021378454, 118.8906994246), (117.718253454, 115.174717233), (105.415128454, 118.8906994246))
            ThreePointArc((105.415128454, 118.8906994246), (111.368253454, 137.399717233), (105.415128454, 155.9087350415))
        make_face(mode=Mode.SUBTRACT)
        with Locations((140.578253454, 137.399717233)):
            Circle(F2_R_3, mode=Mode.SUBTRACT)
    extrude(amount=F6_DEPTH)


with BuildPart() as f11:
    # F7 (on face) → F11 (new body)
    with BuildSketch(Plane.XY.offset(3.175)):
        with Locations((-7.62, -55.0611902535)):
            Rectangle(F7_W, F7_H)
    extrude(amount=F11_DEPTH)

    # F7 (on face) → F13 (join)
    with BuildSketch(Plane.XY.offset(3.175)):
        with Locations((-7.62, -55.0611902535)):
            Rectangle(F7_W, F7_H)
    extrude(amount=-F13_DEPTH)

    # F15 (on face) → F16 (cut)
    with BuildSketch(Plane.XZ.offset(56.6486902535)):
        with BuildLine():
            Line((5.08, 37.126546065), (5.08, 70.823453935))
            ThreePointArc((5.08, 70.823453935), (0, 53.975), (5.08, 37.126546065))
        make_face()
        with BuildLine():
            ThreePointArc((-20.32, 9.525), (-14.47027858, 47.625), (-20.32, 85.725))
            Line((-20.32, 85.725), (-20.32, 9.525))
        make_face()
    extrude(amount=-F16_DEPTH, mode=Mode.SUBTRACT)

    # F15 (on face) → F19 (cut)
    with BuildSketch(Plane.XZ.offset(56.6486902535)):
        with Locations((-7.62, 53.975)):
            Circle(F15_R)
    extrude(amount=-F19_DEPTH, mode=Mode.SUBTRACT)


with BuildPart() as f11b:
    # F7 (on face) → F11, piece 2 (new body)
    with BuildSketch(Plane.XY.offset(3.175)):
        with Locations((33.02, -51.8861902535)):
            Rectangle(F7_W, F7_H)
    extrude(amount=F11_DEPTH)

    # F7 (on face) → F14 (join)
    with BuildSketch(Plane.XY.offset(3.175)):
        with Locations((33.02, -51.8861902535)):
            Rectangle(F7_W, F7_H)
    extrude(amount=-F14_DEPTH)

    # F12 (on face) → F17 (cut)
    with BuildSketch(Plane.XZ.offset(53.4736902535)):
        with BuildLine():
            Line((20.32, 85.725), (20.32, 12.7))
            ThreePointArc((20.32, 12.7), (25.681859009, 49.2125), (20.32, 85.725))
        make_face()
        with BuildLine():
            ThreePointArc((45.72, 85.725), (40.358140991, 49.2125), (45.72, 12.7))
            Line((45.72, 12.7), (45.72, 85.725))
        make_face()
    extrude(amount=-F17_DEPTH, mode=Mode.SUBTRACT)

    # F12 (on face) → F18 (cut)
    with BuildSketch(Plane.XZ.offset(53.4736902535)):
        with Locations((33.02, 53.975)):
            Circle(F12_R)
    extrude(amount=-F18_DEPTH, mode=Mode.SUBTRACT)


with BuildPart() as f20:
    # F2 (on Top) → F20 (new body)
    with BuildSketch(Plane.XY):
        with BuildLine():
            ThreePointArc((130.021378454, 118.8906994246), (124.068253454, 137.399717233), (130.021378454, 155.9087350415))
            ThreePointArc((130.021378454, 155.9087350415), (117.718253454, 159.624717233), (105.415128454, 155.9087350415))
            ThreePointArc((105.415128454, 155.9087350415), (111.368253454, 137.399717233), (105.415128454, 118.8906994246))
            ThreePointArc((105.415128454, 118.8906994246), (117.718253454, 115.174717233), (130.021378454, 118.8906994246))
        make_face()
        with Locations((117.718253454, 137.399717233)):
            Circle(F2_R, mode=Mode.SUBTRACT)
    extrude(amount=-F20_DEPTH)


with BuildPart() as f22:
    # F21 (on Top) → F22 (new body)
    with BuildSketch(Plane.XY):
        with Locations((29.3921194971, -36.6132743657)):
            Circle(F21_R)
    extrude(amount=F22_DEPTH)


with BuildPart() as f23:
    # F21 (on Top) → F23 (new body)
    with BuildSketch(Plane.XY):
        with Locations((-42.0832447708, -36.6132743657)):
            Circle(F21_R_2)
    extrude(amount=F23_DEPTH)


with BuildPart() as f25:
    # F24 (on face) → F25 (new body)
    with BuildSketch(Plane.XY.offset(3.175)):
        with BuildLine():
            Line((-67.4832447708, -34.3907743657), (-67.4832447708, -38.8357743657))
            Line((-67.4832447708, -38.8357743657), (-48.0316053642, -38.8357743657))
            ThreePointArc((-48.0316053642, -38.8357743657), (-48.4332447708, -36.6132743657), (-48.0316053642, -34.3907743657))
            Line((-48.0316053642, -34.3907743657), (-67.4832447708, -34.3907743657))
        make_face()
        with BuildLine():
            ThreePointArc((-48.0316053642, -34.3907743657), (-48.4332447708, -36.6132743657), (-48.0316053642, -38.8357743657))
            Line((-48.0316053642, -38.8357743657), (-36.1348841773, -38.8357743657))
            ThreePointArc((-36.1348841773, -38.8357743657), (-35.8344612984, -37.7425241678), (-35.7332447708, -36.6132743657))
            ThreePointArc((-35.7332447708, -36.6132743657), (-35.8344612984, -35.4840245635), (-36.1348841773, -34.3907743657))
            Line((-36.1348841773, -34.3907743657), (-48.0316053642, -34.3907743657))
        make_face()
    extrude(amount=F25_DEPTH)


with BuildPart() as f26:
    # F21 (on Top) → F26 (new body)
    with BuildSketch(Plane.XY):
        with Locations((0, -36.6132743657)):
            Circle(F21_R)
    extrude(amount=F26_DEPTH)


solid = Compound([f1.part, f4.part, f5.part, f11.part, f11b.part, f20.part, f22.part, f23.part, f25.part, f26.part])
